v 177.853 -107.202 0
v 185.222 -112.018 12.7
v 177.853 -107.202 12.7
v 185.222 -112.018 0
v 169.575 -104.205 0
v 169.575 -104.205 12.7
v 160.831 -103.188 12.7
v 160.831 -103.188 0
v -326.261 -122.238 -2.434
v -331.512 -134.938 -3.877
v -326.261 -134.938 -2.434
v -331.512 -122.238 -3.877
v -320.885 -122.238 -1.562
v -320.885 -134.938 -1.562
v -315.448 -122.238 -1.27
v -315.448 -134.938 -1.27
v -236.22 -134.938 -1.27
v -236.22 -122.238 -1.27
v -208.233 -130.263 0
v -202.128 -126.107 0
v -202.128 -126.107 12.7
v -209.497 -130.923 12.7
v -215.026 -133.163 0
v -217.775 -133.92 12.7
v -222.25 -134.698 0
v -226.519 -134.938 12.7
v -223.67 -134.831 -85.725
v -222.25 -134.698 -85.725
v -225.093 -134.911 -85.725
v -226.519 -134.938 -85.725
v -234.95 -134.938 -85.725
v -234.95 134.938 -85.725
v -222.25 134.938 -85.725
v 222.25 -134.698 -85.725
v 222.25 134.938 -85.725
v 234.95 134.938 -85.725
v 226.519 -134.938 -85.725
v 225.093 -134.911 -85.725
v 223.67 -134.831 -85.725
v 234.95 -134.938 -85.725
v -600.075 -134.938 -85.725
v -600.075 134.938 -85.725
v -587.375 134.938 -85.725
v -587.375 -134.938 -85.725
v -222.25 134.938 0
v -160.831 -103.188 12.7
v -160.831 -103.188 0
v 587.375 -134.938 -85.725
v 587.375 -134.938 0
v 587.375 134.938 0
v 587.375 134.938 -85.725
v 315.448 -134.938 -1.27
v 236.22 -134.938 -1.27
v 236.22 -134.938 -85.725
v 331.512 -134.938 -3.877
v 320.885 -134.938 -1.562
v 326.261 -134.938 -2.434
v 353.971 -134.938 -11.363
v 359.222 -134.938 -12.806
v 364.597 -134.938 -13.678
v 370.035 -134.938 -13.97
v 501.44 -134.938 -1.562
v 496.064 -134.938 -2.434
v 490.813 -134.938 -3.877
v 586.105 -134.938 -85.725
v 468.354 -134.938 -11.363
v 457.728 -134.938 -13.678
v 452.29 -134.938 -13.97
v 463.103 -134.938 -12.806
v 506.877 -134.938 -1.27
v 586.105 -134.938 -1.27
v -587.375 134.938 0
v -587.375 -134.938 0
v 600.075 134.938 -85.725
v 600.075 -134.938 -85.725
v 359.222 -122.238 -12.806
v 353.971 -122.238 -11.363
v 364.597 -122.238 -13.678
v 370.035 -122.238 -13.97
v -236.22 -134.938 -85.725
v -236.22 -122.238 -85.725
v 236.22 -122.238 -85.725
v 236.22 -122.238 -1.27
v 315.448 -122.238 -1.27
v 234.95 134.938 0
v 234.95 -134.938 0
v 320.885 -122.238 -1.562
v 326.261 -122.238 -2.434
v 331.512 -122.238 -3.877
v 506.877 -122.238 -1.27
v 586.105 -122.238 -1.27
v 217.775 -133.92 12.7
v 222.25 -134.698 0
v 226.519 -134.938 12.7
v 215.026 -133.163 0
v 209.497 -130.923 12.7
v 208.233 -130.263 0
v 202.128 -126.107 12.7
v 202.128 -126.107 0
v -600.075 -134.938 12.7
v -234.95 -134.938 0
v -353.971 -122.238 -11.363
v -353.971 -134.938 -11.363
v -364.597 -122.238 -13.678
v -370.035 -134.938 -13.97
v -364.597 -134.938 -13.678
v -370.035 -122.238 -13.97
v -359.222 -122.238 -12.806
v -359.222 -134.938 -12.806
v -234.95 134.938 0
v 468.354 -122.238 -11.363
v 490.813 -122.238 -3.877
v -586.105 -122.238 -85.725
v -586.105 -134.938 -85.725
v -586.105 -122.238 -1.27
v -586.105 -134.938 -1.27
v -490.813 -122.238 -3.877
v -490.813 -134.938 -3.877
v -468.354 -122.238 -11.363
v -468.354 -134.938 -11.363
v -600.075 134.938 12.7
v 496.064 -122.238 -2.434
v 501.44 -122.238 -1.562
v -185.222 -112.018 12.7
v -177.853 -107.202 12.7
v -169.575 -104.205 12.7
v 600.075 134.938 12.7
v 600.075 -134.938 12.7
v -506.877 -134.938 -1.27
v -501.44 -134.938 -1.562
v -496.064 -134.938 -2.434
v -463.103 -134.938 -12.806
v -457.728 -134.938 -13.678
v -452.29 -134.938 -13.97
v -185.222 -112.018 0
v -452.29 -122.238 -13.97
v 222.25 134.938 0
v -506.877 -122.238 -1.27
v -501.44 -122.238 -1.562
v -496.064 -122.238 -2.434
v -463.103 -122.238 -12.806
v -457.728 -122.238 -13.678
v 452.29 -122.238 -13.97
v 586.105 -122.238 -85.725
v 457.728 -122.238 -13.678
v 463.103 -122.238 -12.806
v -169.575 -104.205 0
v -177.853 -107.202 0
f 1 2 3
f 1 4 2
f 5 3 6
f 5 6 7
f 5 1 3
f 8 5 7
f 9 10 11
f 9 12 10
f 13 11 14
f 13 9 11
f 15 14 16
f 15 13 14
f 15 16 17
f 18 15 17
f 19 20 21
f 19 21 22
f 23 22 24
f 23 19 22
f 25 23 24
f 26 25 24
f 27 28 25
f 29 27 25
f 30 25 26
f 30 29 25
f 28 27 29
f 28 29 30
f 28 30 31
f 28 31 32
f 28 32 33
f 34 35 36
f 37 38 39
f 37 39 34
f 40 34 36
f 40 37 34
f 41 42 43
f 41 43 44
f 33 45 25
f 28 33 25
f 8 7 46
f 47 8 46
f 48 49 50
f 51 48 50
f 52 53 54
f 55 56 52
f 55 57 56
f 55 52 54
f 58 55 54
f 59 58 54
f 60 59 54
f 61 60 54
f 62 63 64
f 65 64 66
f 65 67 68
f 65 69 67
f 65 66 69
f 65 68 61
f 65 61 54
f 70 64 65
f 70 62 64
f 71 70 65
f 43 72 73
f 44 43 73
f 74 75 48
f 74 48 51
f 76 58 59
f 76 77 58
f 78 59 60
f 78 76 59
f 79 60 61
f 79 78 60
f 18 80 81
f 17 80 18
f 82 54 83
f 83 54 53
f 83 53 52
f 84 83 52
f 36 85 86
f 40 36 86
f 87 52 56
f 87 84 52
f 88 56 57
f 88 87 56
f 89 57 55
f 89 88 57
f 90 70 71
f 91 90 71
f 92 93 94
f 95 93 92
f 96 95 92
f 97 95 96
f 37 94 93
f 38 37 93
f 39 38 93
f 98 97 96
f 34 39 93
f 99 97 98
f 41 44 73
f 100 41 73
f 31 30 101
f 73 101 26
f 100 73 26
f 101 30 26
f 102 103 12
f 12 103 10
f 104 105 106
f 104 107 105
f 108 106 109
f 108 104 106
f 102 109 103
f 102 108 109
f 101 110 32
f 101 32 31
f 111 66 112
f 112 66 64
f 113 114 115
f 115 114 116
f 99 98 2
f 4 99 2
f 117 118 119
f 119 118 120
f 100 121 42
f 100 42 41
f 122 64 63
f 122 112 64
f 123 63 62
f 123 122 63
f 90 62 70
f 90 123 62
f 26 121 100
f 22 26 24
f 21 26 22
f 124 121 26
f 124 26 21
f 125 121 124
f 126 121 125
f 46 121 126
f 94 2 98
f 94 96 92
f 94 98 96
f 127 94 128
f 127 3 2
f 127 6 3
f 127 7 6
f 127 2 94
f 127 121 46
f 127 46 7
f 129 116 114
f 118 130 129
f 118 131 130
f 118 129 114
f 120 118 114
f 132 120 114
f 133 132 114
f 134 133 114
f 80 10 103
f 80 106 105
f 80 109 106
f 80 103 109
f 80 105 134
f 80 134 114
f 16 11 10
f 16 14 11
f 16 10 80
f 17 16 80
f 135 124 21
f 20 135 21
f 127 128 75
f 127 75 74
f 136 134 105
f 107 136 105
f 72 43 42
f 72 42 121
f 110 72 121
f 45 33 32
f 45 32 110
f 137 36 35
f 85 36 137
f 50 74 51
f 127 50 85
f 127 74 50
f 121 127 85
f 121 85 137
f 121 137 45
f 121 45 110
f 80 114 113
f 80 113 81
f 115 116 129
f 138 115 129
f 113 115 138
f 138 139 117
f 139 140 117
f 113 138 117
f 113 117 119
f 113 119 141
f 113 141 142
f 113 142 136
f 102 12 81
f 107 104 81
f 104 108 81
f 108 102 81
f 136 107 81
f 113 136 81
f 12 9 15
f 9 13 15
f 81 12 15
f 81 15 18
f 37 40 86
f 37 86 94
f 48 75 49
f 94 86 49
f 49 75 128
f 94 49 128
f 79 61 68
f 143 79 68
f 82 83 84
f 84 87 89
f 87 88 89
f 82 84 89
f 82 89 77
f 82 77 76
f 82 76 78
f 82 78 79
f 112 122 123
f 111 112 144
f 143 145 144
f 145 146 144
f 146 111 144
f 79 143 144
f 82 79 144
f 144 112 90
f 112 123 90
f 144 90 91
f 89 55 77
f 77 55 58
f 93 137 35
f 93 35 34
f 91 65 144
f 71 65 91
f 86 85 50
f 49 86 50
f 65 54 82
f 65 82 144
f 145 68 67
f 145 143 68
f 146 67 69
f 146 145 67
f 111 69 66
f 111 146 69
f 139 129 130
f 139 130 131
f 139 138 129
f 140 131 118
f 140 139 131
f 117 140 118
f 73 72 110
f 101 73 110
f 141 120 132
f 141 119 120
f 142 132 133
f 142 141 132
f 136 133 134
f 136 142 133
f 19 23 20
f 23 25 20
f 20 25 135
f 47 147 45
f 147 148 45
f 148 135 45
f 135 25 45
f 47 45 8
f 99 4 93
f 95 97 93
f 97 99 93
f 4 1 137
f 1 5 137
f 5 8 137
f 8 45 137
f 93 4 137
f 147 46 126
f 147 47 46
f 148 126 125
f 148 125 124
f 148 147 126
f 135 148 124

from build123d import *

# Parameters (mm, degrees)
F0_W      = 1200.15
F0_H      = 269.875
F1_DEPTH  = 12.7
F2_W      = 269.875
F2_H      = 85.725
F3_DEPTH  = 12.7
F4_W      = 269.875
F4_H      = 85.725
F5_DEPTH  = 12.7
F6_W      = 12.7
F6_H      = 269.875
F7_DEPTH  = 85.725
F9_DEPTH  = 12.7
F10_R     = 38.1
F11_W     = 349.885
F11_H     = 84.455
F12_DEPTH = 12.7
F13_W     = 349.885
F13_H     = 84.455
F14_DEPTH = 12.7
F16_DEPTH = 12.7
F17_R     = 50.8
F19_DEPTH = 12.7
F20_R     = 50.8


with BuildPart() as f1:
    # F0 (on Top) → F1 (new body)
    with BuildSketch(Plane.XY):
        Rectangle(F0_W, F0_H)
    extrude(amount=F1_DEPTH)

    # F2 (on face) → F3 (join)
    with BuildSketch(Plane(origin=(-600.075, 0, 0), x_dir=(0, -1, 0), z_dir=(-1, 0, 0))):
        with Locations((0, -42.8625)):
            Rectangle(F2_W, F2_H)
    extrude(amount=-F3_DEPTH)

    # F4 (on face) → F5 (join)
    with BuildSketch(Plane.YZ.offset(600.075)):
        with Locations((0, -42.8625)):
            Rectangle(F4_W, F4_H)
    extrude(amount=-F5_DEPTH)

    # F6 (on face) → F7 (join)
    with BuildSketch(Plane(origin=(0, 0, 0), x_dir=(1, 0, 0), z_dir=(0, 0, -1))):
        with Locations((228.6, 0)):
            Rectangle(F6_W, F6_H)
        with Locations((-228.6, 0)):
            Rectangle(F6_W, F6_H)
    extrude(amount=F7_DEPTH)

    # F8 (on face) → F9 (cut)
    with BuildSketch(Plane.XY.offset(12.7)):
        Polygon((174.625, -103.1875), (-174.625, -103.1875), (-212.725, -134.9375), (212.725, -134.9375), align=None)
    extrude(amount=-F9_DEPTH, mode=Mode.SUBTRACT)

    # F10
    f10_edges = [f1.edges().sort_by_distance(p)[0] for p in [
        (-174.625, -103.1875, 6.35),
        (-212.725, -134.9375, 6.35),
        (174.625, -103.1875, 6.35),
        (212.725, -134.9375, 6.35),
    ]]
    fillet(f10_edges, radius=F10_R)


with BuildPart() as f12:
    # F11 (on face) → F12 (new body)
    with BuildSketch(Plane.XZ.offset(134.9375)):
        with Locations((-411.1625, -43.4975)):
            Rectangle(F11_W, F11_H)
    extrude(amount=-F12_DEPTH)

    # F15 (on face) → F16 (cut)
    with BuildSketch(Plane.XZ.offset(134.9375)):
        Polygon((-323.69125, -1.27), (-498.63375, -1.27), (-460.53375, -13.97), (-361.79125, -13.97), align=None)
    extrude(amount=-F16_DEPTH, mode=Mode.SUBTRACT)

    # F17
    f17_edges = [f12.edges().sort_by_distance(p)[0] for p in [
        (-498.63375, -128.5875, -1.27),
        (-460.53375, -128.5875, -13.97),
        (-361.79125, -128.5875, -13.97),
        (-323.69125, -128.5875, -1.27),
    ]]
    fillet(f17_edges, radius=F17_R)


with BuildPart() as f14:
    # F13 (on face) → F14 (new body)
    with BuildSketch(Plane.XZ.offset(134.9375)):
        with Locations((411.1625, -43.4975)):
            Rectangle(F13_W, F13_H)
    extrude(amount=-F14_DEPTH)

    # F18 (on face) → F19 (cut)
    with BuildSketch(Plane.XZ.offset(134.9375)):
        Polygon((498.63375, -1.27), (323.69125, -1.27), (361.79125, -13.97), (460.53375, -13.97), align=None)
    extrude(amount=-F19_DEPTH, mode=Mode.SUBTRACT)

    # F20
    f20_edges = [f14.edges().sort_by_distance(p)[0] for p in [
        (323.69125, -128.5875, -1.27),
        (361.79125, -128.5875, -13.97),
        (460.53375, -128.5875, -13.97),
        (498.63375, -128.5875, -1.27),
    ]]
    fillet(f20_edges, radius=F20_R)


solid = Compound([f1.part, f12.part, f14.part])
